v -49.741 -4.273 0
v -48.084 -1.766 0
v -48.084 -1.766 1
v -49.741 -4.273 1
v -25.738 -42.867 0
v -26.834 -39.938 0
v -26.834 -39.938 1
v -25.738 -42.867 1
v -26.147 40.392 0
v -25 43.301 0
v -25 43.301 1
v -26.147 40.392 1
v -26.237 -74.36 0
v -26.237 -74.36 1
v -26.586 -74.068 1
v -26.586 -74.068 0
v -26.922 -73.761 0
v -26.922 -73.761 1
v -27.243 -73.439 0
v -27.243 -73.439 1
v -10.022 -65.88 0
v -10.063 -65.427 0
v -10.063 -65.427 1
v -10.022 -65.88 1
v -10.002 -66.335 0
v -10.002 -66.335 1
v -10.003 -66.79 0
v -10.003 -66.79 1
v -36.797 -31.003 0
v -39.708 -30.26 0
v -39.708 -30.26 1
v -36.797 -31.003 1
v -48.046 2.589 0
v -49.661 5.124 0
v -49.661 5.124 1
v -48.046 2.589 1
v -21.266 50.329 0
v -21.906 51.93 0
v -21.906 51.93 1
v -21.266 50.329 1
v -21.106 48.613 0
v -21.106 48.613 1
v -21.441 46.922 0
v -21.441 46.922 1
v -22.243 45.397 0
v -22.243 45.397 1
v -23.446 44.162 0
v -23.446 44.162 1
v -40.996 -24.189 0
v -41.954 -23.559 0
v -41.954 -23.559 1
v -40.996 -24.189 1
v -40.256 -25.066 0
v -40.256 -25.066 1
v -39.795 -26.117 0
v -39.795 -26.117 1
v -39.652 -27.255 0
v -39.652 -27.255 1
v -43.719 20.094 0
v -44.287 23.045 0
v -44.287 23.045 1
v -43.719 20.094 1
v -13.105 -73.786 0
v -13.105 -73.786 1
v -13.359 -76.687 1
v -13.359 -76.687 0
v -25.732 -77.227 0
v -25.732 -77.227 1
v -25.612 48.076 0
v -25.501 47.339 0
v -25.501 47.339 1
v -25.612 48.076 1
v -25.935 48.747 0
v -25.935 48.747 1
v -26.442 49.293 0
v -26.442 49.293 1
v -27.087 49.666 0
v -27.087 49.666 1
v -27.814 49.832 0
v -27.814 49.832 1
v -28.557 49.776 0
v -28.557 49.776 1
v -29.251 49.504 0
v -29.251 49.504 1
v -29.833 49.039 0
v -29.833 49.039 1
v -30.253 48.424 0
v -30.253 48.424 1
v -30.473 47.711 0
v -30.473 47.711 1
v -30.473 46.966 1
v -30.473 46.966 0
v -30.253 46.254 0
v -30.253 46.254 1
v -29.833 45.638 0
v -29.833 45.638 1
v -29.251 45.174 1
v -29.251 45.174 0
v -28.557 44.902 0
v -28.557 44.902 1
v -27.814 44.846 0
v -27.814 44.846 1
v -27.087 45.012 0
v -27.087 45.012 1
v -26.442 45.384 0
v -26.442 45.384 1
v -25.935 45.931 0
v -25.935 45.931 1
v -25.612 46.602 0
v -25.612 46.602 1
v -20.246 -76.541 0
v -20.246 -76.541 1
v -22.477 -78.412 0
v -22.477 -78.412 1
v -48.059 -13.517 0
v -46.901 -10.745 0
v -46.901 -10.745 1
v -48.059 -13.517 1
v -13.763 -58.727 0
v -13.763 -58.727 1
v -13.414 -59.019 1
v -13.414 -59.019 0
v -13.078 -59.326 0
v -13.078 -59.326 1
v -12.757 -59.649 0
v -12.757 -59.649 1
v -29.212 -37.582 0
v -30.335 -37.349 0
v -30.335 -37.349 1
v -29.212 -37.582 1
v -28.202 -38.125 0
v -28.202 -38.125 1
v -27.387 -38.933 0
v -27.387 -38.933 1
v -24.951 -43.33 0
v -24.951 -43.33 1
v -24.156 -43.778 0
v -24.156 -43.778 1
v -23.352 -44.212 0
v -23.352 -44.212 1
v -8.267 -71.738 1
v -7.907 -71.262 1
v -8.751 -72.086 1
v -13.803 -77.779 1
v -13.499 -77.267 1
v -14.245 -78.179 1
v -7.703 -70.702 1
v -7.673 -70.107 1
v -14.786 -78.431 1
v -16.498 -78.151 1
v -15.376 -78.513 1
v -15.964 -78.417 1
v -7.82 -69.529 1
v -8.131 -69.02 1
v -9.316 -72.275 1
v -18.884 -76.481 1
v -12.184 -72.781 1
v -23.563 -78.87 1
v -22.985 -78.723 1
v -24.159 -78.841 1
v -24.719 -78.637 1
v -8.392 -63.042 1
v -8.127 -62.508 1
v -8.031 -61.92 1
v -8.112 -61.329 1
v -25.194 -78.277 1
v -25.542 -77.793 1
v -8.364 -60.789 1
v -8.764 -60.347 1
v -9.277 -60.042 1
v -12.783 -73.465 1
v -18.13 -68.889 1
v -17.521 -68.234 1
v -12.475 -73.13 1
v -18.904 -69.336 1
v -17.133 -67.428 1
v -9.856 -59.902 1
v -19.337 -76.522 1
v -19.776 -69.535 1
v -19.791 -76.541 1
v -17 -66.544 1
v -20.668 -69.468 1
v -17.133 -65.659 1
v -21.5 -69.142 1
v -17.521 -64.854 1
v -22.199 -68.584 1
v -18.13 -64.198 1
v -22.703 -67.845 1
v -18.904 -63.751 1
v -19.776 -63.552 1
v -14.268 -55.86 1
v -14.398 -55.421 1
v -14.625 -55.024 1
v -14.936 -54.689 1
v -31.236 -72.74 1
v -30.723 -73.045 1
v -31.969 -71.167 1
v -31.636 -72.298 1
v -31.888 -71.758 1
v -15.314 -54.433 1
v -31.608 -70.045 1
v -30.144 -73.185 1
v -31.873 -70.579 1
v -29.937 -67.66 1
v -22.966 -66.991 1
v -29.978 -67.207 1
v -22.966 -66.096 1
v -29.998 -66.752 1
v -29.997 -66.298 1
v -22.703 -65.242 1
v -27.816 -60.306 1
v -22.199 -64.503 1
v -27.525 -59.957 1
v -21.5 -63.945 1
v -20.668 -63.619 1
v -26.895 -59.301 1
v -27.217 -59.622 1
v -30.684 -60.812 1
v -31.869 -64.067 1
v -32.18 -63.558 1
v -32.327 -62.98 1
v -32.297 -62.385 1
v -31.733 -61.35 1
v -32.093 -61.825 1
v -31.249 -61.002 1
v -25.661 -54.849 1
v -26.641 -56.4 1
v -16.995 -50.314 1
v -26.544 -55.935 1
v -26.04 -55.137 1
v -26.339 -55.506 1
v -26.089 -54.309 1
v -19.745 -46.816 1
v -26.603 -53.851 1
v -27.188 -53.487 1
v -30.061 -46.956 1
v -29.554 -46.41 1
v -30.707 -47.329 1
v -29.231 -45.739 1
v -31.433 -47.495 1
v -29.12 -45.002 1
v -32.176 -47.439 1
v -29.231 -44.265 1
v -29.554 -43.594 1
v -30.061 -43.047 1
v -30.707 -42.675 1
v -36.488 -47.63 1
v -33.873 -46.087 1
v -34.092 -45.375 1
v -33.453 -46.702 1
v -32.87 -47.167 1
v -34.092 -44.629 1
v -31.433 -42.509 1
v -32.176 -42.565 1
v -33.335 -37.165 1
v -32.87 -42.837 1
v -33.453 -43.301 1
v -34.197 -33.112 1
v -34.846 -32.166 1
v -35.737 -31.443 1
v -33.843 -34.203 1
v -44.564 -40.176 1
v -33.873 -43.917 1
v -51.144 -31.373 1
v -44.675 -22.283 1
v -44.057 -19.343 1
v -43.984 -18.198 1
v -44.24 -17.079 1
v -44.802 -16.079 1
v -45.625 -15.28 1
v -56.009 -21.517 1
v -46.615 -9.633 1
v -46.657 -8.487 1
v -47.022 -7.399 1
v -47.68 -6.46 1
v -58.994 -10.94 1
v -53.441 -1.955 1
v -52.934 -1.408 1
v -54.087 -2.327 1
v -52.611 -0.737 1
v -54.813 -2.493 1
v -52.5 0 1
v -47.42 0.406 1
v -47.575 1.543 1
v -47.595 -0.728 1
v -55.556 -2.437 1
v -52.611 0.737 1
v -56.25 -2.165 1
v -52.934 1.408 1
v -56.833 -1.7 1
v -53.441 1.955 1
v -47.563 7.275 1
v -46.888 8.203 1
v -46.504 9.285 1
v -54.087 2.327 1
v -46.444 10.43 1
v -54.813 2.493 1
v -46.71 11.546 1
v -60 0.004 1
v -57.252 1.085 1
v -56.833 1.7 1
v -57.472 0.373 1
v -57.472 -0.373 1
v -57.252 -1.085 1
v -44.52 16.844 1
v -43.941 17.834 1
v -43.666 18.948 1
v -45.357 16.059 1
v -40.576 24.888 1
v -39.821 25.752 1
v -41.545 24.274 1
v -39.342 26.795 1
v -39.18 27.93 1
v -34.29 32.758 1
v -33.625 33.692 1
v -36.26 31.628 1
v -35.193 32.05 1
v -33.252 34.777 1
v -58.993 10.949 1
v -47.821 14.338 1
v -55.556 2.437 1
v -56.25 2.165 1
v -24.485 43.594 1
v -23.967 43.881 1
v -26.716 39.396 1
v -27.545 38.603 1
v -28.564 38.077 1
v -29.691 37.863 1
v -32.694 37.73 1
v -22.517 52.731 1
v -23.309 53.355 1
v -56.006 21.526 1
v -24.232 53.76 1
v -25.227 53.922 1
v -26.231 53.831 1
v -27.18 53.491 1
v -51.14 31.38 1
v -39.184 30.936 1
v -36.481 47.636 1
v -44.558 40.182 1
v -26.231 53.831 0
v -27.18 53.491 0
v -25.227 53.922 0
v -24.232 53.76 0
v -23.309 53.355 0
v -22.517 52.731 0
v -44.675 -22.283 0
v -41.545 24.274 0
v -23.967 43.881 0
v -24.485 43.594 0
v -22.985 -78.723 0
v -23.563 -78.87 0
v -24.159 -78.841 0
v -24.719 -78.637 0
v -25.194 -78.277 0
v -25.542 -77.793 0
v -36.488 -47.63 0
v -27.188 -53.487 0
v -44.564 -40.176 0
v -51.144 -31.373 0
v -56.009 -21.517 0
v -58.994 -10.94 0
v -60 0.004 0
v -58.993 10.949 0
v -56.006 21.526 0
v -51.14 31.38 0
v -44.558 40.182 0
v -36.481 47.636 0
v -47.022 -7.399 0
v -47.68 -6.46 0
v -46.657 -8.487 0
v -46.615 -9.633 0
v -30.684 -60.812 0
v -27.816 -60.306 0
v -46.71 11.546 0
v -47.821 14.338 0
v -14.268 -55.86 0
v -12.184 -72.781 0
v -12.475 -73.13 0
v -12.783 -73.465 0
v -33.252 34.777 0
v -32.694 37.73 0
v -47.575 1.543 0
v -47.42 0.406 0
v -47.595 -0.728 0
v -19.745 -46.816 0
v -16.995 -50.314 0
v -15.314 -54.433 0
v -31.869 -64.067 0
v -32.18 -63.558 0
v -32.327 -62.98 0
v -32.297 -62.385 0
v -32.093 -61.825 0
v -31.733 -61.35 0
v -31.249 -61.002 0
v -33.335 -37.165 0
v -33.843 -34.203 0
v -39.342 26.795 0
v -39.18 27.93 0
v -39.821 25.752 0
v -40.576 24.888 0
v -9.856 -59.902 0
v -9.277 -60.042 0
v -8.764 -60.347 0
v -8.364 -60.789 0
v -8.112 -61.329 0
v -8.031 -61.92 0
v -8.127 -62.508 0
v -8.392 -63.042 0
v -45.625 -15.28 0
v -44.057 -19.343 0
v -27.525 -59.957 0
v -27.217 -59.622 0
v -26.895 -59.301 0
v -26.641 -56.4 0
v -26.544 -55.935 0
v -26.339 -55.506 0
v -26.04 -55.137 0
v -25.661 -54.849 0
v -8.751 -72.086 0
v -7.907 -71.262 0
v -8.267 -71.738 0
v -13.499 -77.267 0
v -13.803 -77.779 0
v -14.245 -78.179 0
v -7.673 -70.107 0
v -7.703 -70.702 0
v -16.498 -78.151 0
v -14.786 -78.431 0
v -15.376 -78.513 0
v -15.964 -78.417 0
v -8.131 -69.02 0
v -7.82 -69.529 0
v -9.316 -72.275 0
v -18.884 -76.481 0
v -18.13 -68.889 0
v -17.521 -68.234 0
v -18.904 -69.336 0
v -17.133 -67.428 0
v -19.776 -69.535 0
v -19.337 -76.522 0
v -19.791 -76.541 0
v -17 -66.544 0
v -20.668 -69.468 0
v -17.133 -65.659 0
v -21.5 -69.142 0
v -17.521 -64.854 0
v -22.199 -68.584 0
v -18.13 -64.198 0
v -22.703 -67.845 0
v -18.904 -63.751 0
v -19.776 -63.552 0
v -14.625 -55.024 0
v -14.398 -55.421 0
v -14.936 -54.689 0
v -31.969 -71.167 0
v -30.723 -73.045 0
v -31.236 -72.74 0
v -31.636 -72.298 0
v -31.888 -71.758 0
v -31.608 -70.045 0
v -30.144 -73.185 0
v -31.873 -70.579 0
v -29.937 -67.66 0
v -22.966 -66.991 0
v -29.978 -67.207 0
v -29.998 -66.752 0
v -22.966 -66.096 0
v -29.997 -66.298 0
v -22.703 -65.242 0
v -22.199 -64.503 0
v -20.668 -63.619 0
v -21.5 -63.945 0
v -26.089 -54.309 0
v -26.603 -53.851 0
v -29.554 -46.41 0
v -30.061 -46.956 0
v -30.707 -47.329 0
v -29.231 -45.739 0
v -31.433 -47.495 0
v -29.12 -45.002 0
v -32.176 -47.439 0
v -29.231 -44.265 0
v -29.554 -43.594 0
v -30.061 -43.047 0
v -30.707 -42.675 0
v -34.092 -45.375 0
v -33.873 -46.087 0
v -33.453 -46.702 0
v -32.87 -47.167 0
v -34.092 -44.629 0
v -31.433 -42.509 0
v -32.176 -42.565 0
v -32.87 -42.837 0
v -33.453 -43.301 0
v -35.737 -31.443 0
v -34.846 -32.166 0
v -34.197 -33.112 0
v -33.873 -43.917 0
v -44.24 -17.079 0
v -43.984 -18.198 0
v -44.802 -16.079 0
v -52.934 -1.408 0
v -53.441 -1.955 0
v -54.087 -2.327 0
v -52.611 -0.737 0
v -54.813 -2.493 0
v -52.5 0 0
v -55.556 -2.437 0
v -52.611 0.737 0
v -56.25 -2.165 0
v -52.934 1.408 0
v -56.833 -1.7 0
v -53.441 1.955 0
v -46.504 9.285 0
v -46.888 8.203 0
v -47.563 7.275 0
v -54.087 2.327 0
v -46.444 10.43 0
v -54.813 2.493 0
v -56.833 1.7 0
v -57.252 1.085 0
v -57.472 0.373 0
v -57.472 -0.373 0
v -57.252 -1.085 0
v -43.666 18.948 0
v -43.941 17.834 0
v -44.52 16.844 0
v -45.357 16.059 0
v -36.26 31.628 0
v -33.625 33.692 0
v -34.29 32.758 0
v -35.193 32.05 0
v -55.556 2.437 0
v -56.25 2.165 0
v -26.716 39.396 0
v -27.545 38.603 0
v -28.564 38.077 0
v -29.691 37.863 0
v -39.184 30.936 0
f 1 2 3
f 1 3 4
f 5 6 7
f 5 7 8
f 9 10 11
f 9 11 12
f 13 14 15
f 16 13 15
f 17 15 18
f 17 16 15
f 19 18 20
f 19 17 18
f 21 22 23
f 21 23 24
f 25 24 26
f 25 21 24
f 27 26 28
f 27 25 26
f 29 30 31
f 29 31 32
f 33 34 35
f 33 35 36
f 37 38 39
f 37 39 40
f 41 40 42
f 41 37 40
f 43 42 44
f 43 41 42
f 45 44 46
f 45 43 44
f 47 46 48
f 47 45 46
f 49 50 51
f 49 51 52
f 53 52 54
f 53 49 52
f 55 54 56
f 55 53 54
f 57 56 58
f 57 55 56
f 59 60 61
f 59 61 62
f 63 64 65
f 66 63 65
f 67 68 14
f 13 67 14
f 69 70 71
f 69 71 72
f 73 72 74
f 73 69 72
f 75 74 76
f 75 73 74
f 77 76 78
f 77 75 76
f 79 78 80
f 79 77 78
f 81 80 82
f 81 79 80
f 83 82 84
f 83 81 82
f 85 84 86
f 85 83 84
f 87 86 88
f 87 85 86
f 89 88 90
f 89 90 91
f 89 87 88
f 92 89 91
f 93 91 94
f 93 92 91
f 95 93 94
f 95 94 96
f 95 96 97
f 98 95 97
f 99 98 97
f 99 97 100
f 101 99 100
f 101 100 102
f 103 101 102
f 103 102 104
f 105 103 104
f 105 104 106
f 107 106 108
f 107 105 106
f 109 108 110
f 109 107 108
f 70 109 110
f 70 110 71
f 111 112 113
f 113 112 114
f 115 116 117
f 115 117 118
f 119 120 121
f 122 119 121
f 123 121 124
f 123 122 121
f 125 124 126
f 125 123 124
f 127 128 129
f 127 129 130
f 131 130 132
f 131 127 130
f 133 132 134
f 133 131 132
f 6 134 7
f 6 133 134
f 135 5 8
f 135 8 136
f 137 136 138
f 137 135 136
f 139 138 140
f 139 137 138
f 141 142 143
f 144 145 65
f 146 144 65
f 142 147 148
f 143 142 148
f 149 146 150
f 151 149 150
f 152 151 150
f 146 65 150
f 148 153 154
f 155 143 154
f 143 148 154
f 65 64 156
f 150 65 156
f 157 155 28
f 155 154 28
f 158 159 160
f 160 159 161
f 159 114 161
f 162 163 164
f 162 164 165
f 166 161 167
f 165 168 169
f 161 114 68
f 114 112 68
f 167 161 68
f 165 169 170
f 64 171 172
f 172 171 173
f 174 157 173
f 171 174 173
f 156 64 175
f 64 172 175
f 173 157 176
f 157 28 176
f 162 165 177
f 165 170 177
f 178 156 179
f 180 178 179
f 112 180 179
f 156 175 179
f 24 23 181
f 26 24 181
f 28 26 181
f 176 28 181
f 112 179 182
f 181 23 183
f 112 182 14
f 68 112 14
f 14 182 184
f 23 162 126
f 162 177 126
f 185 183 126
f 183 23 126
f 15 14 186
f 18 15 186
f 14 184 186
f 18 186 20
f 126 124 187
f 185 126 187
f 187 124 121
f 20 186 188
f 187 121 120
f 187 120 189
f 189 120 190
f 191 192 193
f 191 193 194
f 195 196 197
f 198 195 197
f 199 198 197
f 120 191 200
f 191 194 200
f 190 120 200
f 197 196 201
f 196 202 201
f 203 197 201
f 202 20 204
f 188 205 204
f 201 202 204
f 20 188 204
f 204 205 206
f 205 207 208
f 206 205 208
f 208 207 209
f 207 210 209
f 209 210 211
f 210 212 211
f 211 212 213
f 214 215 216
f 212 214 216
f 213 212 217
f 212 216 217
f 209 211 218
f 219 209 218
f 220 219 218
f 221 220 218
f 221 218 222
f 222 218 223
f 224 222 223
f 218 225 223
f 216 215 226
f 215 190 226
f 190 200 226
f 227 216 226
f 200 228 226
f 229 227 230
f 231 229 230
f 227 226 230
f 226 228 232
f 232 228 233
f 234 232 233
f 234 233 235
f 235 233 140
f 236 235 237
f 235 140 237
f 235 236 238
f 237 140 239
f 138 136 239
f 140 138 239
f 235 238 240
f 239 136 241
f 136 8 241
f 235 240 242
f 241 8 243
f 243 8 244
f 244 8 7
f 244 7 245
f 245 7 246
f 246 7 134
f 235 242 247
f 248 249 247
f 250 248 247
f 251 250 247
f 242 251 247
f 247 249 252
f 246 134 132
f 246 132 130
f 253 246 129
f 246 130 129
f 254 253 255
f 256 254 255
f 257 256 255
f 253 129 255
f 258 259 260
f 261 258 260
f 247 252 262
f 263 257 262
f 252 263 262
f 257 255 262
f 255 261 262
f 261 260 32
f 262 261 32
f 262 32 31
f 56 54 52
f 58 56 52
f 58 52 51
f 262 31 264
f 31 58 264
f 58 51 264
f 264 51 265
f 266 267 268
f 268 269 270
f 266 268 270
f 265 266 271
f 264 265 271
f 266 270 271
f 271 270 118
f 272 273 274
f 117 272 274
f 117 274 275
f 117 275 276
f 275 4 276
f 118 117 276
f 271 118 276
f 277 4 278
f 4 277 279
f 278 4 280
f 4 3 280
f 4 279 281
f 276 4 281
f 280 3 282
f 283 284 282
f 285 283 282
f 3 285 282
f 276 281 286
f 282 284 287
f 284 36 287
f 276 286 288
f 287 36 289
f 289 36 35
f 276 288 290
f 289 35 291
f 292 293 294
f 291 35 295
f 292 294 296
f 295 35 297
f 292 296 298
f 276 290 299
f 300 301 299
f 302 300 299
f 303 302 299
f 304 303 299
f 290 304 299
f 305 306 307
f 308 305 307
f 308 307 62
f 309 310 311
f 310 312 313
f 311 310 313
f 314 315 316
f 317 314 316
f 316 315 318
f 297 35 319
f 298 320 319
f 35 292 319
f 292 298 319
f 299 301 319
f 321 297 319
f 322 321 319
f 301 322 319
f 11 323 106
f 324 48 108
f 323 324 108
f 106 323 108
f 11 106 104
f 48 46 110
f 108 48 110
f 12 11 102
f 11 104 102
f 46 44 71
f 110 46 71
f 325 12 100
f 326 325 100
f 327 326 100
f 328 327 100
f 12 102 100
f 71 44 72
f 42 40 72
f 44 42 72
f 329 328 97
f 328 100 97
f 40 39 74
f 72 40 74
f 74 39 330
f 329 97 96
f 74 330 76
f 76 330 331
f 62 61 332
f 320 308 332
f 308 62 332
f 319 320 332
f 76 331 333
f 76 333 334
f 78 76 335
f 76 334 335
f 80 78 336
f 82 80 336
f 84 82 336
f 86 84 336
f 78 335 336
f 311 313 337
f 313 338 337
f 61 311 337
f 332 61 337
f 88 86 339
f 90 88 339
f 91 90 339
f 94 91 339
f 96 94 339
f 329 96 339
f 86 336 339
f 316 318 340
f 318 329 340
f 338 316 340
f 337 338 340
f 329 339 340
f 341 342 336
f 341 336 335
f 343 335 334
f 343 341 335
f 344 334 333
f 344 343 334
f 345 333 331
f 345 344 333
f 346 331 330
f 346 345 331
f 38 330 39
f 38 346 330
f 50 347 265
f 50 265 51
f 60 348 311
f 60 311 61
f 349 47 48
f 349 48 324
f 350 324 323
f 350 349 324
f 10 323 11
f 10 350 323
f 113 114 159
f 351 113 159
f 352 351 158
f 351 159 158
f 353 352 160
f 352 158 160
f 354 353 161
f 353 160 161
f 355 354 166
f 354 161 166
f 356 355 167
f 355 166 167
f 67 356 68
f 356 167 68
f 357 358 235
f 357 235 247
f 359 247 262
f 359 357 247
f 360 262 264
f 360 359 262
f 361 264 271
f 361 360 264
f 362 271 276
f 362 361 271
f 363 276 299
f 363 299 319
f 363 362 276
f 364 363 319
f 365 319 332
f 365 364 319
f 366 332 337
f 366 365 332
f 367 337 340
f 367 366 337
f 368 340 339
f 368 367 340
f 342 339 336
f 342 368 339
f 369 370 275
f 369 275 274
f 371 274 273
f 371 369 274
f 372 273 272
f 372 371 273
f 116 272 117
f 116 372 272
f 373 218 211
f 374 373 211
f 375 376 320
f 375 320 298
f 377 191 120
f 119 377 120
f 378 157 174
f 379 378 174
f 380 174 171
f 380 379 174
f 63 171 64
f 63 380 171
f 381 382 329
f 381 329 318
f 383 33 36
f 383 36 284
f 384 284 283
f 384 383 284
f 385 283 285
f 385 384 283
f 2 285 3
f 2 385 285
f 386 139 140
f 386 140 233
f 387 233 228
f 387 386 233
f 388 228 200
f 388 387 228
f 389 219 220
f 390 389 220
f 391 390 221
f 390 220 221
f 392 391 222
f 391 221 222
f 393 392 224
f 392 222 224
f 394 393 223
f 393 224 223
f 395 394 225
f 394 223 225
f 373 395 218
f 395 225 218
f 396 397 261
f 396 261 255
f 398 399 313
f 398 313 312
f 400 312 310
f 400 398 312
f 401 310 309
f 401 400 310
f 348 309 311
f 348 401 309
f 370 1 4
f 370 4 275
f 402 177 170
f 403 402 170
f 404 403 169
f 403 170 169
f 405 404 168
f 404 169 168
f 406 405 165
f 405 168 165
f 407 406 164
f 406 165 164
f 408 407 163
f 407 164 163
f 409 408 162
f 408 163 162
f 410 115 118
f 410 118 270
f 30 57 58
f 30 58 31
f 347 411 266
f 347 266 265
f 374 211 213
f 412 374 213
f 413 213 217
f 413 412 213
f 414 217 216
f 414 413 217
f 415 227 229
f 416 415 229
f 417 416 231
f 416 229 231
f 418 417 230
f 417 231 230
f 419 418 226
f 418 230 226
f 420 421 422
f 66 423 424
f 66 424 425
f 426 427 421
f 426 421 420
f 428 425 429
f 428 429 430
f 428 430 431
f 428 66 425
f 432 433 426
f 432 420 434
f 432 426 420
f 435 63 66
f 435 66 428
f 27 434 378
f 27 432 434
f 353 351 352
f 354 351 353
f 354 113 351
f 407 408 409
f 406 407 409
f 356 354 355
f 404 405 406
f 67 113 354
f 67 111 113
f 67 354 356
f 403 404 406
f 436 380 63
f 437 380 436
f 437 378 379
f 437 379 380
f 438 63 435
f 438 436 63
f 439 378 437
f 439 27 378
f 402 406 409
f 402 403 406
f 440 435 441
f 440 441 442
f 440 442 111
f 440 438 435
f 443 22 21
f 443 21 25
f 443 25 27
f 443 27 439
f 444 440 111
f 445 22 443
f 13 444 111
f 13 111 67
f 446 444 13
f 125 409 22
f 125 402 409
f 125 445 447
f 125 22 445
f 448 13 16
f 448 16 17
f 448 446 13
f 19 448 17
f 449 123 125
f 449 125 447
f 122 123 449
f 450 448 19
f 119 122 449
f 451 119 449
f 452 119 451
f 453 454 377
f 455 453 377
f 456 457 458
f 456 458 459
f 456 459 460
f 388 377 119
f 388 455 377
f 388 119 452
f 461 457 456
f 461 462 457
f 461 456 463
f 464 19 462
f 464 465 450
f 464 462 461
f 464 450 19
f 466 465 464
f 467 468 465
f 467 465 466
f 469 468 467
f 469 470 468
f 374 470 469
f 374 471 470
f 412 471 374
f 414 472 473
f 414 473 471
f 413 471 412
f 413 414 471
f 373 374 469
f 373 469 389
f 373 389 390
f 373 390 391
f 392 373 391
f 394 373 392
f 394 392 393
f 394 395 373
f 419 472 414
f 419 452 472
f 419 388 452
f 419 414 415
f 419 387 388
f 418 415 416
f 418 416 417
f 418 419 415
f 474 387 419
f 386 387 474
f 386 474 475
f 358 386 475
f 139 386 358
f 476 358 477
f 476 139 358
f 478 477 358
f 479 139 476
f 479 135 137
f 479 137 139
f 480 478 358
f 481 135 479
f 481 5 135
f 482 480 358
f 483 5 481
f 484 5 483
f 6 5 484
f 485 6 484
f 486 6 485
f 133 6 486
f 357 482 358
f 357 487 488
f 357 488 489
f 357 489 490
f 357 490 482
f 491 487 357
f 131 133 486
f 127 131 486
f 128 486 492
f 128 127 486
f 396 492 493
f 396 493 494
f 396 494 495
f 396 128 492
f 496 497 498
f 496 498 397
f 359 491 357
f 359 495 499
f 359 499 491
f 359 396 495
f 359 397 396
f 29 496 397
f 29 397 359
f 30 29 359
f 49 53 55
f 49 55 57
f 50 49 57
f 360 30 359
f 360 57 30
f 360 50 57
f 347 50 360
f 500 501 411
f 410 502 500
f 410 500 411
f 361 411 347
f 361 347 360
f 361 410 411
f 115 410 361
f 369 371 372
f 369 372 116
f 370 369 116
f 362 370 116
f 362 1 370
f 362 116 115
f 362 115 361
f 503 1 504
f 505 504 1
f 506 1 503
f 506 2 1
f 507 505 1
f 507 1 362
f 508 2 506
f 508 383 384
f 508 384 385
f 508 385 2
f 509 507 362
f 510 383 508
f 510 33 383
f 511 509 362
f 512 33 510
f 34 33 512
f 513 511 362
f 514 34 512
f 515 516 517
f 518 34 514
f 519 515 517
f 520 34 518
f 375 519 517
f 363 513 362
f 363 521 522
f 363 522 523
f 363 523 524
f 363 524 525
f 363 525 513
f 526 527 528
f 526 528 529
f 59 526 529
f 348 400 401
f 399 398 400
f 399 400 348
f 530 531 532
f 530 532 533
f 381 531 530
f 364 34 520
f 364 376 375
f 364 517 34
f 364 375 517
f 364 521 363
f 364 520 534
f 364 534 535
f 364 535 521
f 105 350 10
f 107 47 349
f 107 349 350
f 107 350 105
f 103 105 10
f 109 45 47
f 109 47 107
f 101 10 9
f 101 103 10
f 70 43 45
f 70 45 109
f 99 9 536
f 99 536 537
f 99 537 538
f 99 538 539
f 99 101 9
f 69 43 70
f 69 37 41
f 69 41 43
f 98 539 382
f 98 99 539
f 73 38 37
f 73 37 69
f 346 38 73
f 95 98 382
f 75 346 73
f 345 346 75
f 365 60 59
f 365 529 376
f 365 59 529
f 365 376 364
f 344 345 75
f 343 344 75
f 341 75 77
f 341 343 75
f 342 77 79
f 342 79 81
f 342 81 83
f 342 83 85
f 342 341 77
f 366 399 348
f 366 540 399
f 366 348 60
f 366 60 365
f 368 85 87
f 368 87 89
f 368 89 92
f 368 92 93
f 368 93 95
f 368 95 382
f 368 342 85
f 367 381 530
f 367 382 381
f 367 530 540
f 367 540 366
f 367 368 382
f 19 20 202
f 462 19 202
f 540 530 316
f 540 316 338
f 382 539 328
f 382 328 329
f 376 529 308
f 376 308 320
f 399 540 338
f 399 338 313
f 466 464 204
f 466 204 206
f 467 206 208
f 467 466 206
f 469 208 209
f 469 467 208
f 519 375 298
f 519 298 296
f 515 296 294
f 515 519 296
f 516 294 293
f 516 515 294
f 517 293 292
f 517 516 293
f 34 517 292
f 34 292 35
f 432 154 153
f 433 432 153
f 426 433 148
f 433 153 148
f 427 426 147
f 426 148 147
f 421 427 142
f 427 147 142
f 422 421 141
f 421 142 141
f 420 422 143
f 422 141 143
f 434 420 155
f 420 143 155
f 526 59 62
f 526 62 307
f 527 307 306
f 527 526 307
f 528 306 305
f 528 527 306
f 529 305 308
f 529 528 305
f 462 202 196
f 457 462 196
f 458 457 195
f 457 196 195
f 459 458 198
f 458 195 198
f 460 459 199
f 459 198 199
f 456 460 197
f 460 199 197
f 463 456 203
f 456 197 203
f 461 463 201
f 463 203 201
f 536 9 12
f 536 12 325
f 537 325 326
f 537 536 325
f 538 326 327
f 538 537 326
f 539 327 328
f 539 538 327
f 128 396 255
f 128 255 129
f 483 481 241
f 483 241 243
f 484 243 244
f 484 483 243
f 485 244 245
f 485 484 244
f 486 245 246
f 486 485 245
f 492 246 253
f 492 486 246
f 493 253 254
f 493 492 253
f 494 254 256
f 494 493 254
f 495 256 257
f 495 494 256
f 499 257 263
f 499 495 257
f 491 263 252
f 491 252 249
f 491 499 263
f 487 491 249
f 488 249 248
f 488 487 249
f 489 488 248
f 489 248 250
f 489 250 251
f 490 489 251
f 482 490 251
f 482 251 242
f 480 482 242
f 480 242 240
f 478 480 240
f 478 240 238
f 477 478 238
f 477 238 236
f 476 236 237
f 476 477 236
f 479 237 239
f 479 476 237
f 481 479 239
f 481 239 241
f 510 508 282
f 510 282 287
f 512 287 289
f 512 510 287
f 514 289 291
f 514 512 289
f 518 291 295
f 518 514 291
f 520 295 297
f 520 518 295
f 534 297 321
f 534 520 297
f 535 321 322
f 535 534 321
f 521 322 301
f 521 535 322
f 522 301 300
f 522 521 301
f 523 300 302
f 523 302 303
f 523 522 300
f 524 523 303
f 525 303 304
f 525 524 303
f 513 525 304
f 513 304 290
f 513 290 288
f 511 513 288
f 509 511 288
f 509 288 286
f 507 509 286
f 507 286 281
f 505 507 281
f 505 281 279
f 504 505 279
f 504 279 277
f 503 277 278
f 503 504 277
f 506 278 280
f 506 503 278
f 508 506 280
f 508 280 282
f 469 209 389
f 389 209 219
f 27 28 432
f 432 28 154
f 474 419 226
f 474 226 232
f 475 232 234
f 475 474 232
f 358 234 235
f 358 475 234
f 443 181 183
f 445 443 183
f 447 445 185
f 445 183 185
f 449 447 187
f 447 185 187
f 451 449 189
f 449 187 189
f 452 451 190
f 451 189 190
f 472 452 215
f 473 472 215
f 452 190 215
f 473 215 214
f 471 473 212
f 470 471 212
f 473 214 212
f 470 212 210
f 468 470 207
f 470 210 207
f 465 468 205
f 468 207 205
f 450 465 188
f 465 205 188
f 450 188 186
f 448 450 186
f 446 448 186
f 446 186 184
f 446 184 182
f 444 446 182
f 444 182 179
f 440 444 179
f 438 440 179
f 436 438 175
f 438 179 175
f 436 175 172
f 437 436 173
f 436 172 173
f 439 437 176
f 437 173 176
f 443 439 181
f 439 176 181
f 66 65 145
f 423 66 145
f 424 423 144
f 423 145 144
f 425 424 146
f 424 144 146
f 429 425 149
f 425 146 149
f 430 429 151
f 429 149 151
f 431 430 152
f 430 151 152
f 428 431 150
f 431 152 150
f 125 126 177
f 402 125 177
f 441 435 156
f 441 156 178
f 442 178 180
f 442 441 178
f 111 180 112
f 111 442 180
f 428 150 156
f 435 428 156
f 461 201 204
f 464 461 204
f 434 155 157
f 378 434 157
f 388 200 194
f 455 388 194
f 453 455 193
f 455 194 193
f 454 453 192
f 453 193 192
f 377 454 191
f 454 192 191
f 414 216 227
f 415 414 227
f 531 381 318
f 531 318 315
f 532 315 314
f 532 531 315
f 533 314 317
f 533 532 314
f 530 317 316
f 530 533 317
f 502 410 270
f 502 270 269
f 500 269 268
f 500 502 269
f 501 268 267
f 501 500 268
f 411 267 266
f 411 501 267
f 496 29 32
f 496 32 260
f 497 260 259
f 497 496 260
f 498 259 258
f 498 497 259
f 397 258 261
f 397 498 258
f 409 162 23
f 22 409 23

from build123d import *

# Parameters (mm, degrees)
IZIM1_R                     = 5
IZIM1_R_2                   = 2.5
Y_KSEKLIK_EKSTR_ZYON2_DEPTH = 1
IZIM2_R                     = 3
Y_KSEKLIK_EKSTR_ZYON4_DEPTH = 1


with BuildPart() as part:
    # Çizim1 → Yükseklik-Ekstrüzyon2 (new body)
    with BuildSketch(Plane.XY):
        with BuildLine():
            Line((-25, 43.301270189), (-26.146521576, 40.39207739))
            ThreePointArc((-26.146521576, 40.39207739), (-27.544598222, 38.602623821), (-29.691484877, 37.862596744))
            Line((-29.691484877, 37.862596744), (-32.693673826, 37.730024144))
            Line((-32.693673826, 37.730024144), (-33.252115355, 34.777253066))
            ThreePointArc((-33.252115355, 34.777253066), (-34.290118058, 32.757522199), (-36.260310201, 31.628316593))
            Line((-36.260310201, 31.628316593), (-39.184480502, 30.935538106))
            Line((-39.184480502, 30.935538106), (-39.17973637, 27.930427214))
            ThreePointArc((-39.17973637, 27.930427214), (-39.820893366, 25.751969023), (-41.54459596, 24.273587558))
            Line((-41.54459596, 24.273587558), (-44.287157421, 23.045145208))
            Line((-44.287157421, 23.045145208), (-43.719395692, 20.094152054))
            ThreePointArc((-43.719395692, 20.094152054), (-43.940993675, 17.834139505), (-45.357143694, 16.058954583))
            Line((-45.357143694, 16.058954583), (-47.82093971, 14.338366552))
            Line((-47.82093971, 14.338366552), (-46.710273625, 11.546031539))
            ThreePointArc((-46.710273625, 11.546031539), (-46.504462376, 9.284526705), (-47.562892001, 7.275425136))
            Line((-47.562892001, 7.275425136), (-49.660641368, 5.123644113))
            Line((-49.660641368, 5.123644113), (-48.046416828, 2.588887101))
            ThreePointArc((-48.046416828, 2.588887101), (-47.420487313, 0.406004917), (-48.083701146, -1.765839874))
            Line((-48.083701146, -1.765839874), (-49.741090048, -4.272585973))
            Line((-49.741090048, -4.272585973), (-47.680491761, -6.459969953))
            ThreePointArc((-47.680491761, -6.459969953), (-46.656617846, -8.486899797), (-46.901121207, -10.744549126))
            Line((-46.901121207, -10.744549126), (-48.059435816, -13.517457571))
            Line((-48.059435816, -13.517457571), (-45.625461503, -15.279979352))
            ThreePointArc((-45.625461503, -15.279979352), (-44.239914432, -17.079151855), (-44.057045667, -19.342627369))
            Line((-44.057045667, -19.342627369), (-44.675252109, -22.283466496))
            Line((-44.675252109, -22.283466496), (-41.954126526, -23.558687864))
            ThreePointArc((-41.954126526, -23.558687864), (-40.255989993, -25.066366444), (-39.652227319, -27.255483394))
            Line((-39.652227319, -27.255483394), (-39.708425324, -30.260072511))
            Line((-39.708425324, -30.260072511), (-36.7965457, -31.002818113))
            ThreePointArc((-36.7965457, -31.002818113), (-34.84597704, -32.165592505), (-33.842709051, -34.202800331))
            Line((-33.842709051, -34.202800331), (-33.334907776, -37.164700371))
            Line((-33.334907776, -37.164700371), (-30.335428898, -37.348658075))
            ThreePointArc((-30.335428898, -37.348658075), (-28.201527977, -38.125336415), (-26.834295942, -39.938466016))
            Line((-26.834295942, -39.938466016), (-25.73775467, -42.866863479))
            ThreePointArc((-25.73775467, -42.866863479), (-24.554196145, -43.55561332), (-23.352220135, -44.21169319))
            ThreePointArc((-23.352220135, -44.21169319), (-17.219408632, -49.939828574), (-14.829333353, -57.984109281))
            ThreePointArc((-14.829333353, -57.984109281), (-20.099106379, -76.543069457), (-25, -57.883306535))
            Line((-25, -57.883306535), (-25, -57.052607302))
            ThreePointArc((-25, -57.052607302), (-25.590454576, -54.960957236), (-27.1875, -53.486819346))
            ThreePointArc((-27.1875, -53.486819346), (-59.999999835, 0.004450967), (-27.179564099, 53.490852446))
            ThreePointArc((-27.179564099, 53.490852446), (-24.232021318, 53.76021953), (-21.906244367, 51.929556087))
            ThreePointArc((-21.906244367, 51.929556087), (-21.212806241, 47.755648425), (-23.446136356, 44.161959762))
            ThreePointArc((-23.446136356, 44.161959762), (-24.226890609, 43.73851588), (-25, 43.301270189))
        make_face()
        with Locations((-20, -66.543560573)):
            Circle(IZIM1_R, mode=Mode.SUBTRACT)
        with Locations((-31.620079453, -45.001895242)):
            Circle(IZIM1_R_2, mode=Mode.SUBTRACT)
        with Locations((-55, 0)):
            Circle(IZIM1_R_2, mode=Mode.SUBTRACT)
        with Locations((-28.000624989, 47.338831842)):
            Circle(IZIM1_R_2, mode=Mode.SUBTRACT)
    extrude(amount=Y_KSEKLIK_EKSTR_ZYON2_DEPTH)

    # Çizim2 → Yükseklik-Ekstrüzyon4 (add)
    with BuildSketch(Plane.XY.offset(1)):
        with BuildLine():
            Line((-14.268162917, -55.859645389), (-13.746523784, -58.818007922))
            ThreePointArc((-13.746523784, -58.818007922), (-13.437306239, -59.381637082), (-12.848871774, -59.640554443))
            Line((-12.848871774, -59.640554443), (-9.856302857, -59.902370298))
            ThreePointArc((-9.856302857, -59.902370298), (-8.217998769, -61.049523171), (-8.392310254, -63.041912567))
            Line((-8.392310254, -63.041912567), (-10.115333894, -65.502645344))
            ThreePointArc((-10.115333894, -65.502645344), (-10.295230071, -66.119841167), (-10.062226293, -66.71900939))
            Line((-10.062226293, -66.71900939), (-8.131292285, -69.02020693))
            ThreePointArc((-8.131292285, -69.02020693), (-7.78399593, -70.989822436), (-9.316084816, -72.275397656))
            Line((-9.316084816, -72.275397656), (-12.274447349, -72.797036789))
            ThreePointArc((-12.274447349, -72.797036789), (-12.838076508, -73.106254334), (-13.09699387, -73.694688799))
            Line((-13.09699387, -73.694688799), (-13.358809725, -76.687257716))
            ThreePointArc((-13.358809725, -76.687257716), (-14.505962597, -78.325561805), (-16.498351994, -78.151250319))
            Line((-16.498351994, -78.151250319), (-18.95908477, -76.428226679))
            ThreePointArc((-18.95908477, -76.428226679), (-19.576280594, -76.248330502), (-20.175448817, -76.48133428))
            Line((-20.175448817, -76.48133428), (-22.476646357, -78.412268288))
            ThreePointArc((-22.476646357, -78.412268288), (-24.446261863, -78.759564643), (-25.731837083, -77.227475757))
            Line((-25.731837083, -77.227475757), (-26.253476216, -74.269113224))
            ThreePointArc((-26.253476216, -74.269113224), (-26.562693761, -73.705484065), (-27.151128226, -73.446566704))
            Line((-27.151128226, -73.446566704), (-30.143697143, -73.184750849))
            ThreePointArc((-30.143697143, -73.184750849), (-31.782001231, -72.037597976), (-31.607689746, -70.04520858))
            Line((-31.607689746, -70.04520858), (-29.884666106, -67.584475803))
            ThreePointArc((-29.884666106, -67.584475803), (-29.704769929, -66.967279979), (-29.937773707, -66.368111757))
            Line((-29.937773707, -66.368111757), (-31.868707715, -64.066914216))
            ThreePointArc((-31.868707715, -64.066914216), (-32.21600407, -62.09729871), (-30.683915184, -60.811723491))
            Line((-30.683915184, -60.811723491), (-27.725552651, -60.290084357))
            ThreePointArc((-27.725552651, -60.290084357), (-27.161923492, -59.980866812), (-26.90300613, -59.392432347))
            Line((-26.90300613, -59.392432347), (-26.641190275, -56.39986343))
            ThreePointArc((-26.641190275, -56.39986343), (-25.494037403, -54.761559342), (-23.501648006, -54.935870827))
            Line((-23.501648006, -54.935870827), (-21.04091523, -56.658894467))
            ThreePointArc((-21.04091523, -56.658894467), (-20.423719406, -56.838790644), (-19.824551183, -56.605786866))
            Line((-19.824551183, -56.605786866), (-17.523353643, -54.674852858))
            ThreePointArc((-17.523353643, -54.674852858), (-15.553738137, -54.327556503), (-14.268162917, -55.859645389))
        make_face()
        with Locations((-20, -66.543560573)):
            Circle(IZIM2_R, mode=Mode.SUBTRACT)
    extrude(amount=-Y_KSEKLIK_EKSTR_ZYON4_DEPTH)


solid = part.part
